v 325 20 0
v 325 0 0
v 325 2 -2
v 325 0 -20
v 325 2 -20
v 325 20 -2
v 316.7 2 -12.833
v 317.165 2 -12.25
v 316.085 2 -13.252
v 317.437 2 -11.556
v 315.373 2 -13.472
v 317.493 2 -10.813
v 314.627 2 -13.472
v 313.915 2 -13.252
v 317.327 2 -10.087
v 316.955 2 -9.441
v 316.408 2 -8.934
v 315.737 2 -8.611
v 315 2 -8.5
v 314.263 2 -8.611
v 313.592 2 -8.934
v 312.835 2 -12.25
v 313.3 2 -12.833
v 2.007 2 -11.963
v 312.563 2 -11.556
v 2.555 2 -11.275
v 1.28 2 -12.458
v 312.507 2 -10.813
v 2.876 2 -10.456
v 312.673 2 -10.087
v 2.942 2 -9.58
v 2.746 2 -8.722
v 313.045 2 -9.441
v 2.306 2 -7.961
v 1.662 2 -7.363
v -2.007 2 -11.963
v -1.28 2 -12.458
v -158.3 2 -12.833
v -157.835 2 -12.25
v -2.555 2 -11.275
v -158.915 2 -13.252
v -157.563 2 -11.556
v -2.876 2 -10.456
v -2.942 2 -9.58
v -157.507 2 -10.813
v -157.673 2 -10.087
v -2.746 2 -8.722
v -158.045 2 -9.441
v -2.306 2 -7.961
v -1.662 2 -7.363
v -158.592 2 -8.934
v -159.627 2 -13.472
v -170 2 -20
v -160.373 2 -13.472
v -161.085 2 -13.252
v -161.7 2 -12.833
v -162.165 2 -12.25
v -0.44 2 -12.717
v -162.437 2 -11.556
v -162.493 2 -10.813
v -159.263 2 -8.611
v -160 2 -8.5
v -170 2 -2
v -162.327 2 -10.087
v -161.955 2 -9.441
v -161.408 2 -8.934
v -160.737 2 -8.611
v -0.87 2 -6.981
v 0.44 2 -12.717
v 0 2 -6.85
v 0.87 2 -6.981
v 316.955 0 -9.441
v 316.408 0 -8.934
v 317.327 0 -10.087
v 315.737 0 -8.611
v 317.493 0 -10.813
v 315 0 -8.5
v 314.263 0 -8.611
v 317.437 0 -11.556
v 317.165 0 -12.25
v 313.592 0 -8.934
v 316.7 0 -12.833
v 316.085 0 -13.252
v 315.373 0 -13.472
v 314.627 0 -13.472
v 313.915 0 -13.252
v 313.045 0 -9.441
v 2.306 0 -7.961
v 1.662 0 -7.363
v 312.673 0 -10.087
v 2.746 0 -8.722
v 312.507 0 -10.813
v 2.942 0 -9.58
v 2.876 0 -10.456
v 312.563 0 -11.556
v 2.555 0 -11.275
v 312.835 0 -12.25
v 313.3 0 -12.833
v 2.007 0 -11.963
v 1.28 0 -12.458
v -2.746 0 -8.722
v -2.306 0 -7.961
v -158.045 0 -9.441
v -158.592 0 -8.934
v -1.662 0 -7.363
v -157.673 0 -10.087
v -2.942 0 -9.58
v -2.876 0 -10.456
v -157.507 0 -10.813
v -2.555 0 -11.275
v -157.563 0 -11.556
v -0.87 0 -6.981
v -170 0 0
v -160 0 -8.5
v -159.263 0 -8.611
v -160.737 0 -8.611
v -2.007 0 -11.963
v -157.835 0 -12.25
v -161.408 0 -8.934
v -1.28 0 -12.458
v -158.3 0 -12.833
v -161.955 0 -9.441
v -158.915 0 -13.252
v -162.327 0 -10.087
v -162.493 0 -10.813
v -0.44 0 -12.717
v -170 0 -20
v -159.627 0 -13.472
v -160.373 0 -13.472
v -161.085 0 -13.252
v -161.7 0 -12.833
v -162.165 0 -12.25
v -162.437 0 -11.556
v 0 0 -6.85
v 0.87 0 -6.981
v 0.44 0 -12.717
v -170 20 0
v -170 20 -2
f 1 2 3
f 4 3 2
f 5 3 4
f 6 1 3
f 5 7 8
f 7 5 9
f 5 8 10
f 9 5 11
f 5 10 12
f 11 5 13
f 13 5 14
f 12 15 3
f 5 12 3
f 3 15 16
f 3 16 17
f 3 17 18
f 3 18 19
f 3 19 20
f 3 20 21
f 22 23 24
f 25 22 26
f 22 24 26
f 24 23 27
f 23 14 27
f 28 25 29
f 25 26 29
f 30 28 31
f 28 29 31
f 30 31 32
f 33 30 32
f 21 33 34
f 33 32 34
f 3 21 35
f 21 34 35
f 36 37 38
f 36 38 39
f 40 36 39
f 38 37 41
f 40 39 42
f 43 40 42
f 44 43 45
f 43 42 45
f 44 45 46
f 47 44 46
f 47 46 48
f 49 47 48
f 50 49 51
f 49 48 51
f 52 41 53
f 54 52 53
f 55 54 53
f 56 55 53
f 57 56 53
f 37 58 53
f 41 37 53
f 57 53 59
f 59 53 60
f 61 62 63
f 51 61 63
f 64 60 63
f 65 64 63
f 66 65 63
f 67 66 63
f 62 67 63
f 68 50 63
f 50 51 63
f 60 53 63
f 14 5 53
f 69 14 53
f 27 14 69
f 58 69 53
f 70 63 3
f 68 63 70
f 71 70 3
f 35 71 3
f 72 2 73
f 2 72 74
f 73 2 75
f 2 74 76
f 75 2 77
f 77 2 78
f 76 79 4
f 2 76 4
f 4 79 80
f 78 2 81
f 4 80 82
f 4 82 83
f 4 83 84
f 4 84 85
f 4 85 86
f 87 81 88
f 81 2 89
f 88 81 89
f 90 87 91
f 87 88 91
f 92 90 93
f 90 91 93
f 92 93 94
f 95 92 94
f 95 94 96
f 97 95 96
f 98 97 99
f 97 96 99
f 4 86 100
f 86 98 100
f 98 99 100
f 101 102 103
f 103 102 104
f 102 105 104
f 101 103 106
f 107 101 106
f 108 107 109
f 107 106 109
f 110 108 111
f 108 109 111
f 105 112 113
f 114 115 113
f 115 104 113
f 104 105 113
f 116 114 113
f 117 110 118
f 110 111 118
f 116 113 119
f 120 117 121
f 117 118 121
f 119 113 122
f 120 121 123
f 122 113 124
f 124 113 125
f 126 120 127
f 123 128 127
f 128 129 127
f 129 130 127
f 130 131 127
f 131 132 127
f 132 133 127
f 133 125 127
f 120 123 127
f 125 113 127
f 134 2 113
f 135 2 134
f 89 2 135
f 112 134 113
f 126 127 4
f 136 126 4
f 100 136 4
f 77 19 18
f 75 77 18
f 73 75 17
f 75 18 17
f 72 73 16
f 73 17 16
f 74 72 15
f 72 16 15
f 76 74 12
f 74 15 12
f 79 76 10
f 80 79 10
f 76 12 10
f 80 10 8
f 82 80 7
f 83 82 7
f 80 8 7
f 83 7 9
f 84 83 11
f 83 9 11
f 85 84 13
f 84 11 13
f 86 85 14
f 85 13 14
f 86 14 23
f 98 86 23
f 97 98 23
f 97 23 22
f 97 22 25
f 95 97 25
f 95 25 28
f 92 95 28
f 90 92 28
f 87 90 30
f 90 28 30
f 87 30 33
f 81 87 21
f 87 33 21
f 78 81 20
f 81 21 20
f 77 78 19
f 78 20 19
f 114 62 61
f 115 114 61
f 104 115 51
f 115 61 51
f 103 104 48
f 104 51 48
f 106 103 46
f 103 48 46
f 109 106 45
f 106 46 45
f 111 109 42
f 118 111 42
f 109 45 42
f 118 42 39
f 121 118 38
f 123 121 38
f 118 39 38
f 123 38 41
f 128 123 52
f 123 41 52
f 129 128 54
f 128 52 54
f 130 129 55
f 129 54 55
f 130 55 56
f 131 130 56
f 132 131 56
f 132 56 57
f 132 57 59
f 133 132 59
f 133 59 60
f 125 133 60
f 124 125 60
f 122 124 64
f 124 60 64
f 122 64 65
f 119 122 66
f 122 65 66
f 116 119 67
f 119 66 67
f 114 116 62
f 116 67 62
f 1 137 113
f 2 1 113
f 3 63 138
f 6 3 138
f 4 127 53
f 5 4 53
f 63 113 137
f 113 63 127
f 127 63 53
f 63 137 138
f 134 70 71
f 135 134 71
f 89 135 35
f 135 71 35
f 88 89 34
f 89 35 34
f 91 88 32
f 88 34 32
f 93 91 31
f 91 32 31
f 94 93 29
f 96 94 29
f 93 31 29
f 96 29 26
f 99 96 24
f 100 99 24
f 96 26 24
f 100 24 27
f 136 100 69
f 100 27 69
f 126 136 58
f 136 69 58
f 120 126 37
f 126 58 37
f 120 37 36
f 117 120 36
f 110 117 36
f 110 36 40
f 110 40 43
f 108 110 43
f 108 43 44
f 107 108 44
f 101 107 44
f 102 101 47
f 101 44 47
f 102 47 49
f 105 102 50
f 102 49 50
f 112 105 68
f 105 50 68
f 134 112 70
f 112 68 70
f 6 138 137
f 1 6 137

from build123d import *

# Parameters (mm, degrees)
BOSS_EXTRUDE1_DEPTH      = 325
BOSS_EXTRUDE1_DEPTH_BACK = 170
SKETCH2_R                = 2.95
SKETCH2_R_2              = 2.5
CUT_EXTRUDE1_DEPTH       = 2


with BuildPart() as part:
    # Sketch1 → Boss-Extrude1 (new, two sides: drawn at the far end of the back side and taken through both)
    with BuildSketch(Plane(origin=(0, 0, 0), x_dir=(0, 0, -1), z_dir=(1, 0, 0)).offset(-BOSS_EXTRUDE1_DEPTH_BACK)):
        Polygon((0, 20), (0, 0), (20, 0), (20, 2), (2, 2), (2, 20), align=None)
    extrude(amount=BOSS_EXTRUDE1_DEPTH + BOSS_EXTRUDE1_DEPTH_BACK)

    # Sketch2 → Cut-Extrude1 (cut)
    with BuildSketch(Plane(origin=(0, 2, 0), x_dir=(1, 0, 0), z_dir=(0, 1, 0))):
        with Locations(Location((0, 9.8, 0), (0, 0, 270))):
            Circle(SKETCH2_R)
        with Locations(Location((315, 11, 0), (0, 0, 270))):
            Circle(SKETCH2_R_2)
        with Locations(Location((-160, 11, 0), (0, 0, 270))):
            Circle(SKETCH2_R_2)
    extrude(amount=-CUT_EXTRUDE1_DEPTH, mode=Mode.SUBTRACT)


solid = part.part
